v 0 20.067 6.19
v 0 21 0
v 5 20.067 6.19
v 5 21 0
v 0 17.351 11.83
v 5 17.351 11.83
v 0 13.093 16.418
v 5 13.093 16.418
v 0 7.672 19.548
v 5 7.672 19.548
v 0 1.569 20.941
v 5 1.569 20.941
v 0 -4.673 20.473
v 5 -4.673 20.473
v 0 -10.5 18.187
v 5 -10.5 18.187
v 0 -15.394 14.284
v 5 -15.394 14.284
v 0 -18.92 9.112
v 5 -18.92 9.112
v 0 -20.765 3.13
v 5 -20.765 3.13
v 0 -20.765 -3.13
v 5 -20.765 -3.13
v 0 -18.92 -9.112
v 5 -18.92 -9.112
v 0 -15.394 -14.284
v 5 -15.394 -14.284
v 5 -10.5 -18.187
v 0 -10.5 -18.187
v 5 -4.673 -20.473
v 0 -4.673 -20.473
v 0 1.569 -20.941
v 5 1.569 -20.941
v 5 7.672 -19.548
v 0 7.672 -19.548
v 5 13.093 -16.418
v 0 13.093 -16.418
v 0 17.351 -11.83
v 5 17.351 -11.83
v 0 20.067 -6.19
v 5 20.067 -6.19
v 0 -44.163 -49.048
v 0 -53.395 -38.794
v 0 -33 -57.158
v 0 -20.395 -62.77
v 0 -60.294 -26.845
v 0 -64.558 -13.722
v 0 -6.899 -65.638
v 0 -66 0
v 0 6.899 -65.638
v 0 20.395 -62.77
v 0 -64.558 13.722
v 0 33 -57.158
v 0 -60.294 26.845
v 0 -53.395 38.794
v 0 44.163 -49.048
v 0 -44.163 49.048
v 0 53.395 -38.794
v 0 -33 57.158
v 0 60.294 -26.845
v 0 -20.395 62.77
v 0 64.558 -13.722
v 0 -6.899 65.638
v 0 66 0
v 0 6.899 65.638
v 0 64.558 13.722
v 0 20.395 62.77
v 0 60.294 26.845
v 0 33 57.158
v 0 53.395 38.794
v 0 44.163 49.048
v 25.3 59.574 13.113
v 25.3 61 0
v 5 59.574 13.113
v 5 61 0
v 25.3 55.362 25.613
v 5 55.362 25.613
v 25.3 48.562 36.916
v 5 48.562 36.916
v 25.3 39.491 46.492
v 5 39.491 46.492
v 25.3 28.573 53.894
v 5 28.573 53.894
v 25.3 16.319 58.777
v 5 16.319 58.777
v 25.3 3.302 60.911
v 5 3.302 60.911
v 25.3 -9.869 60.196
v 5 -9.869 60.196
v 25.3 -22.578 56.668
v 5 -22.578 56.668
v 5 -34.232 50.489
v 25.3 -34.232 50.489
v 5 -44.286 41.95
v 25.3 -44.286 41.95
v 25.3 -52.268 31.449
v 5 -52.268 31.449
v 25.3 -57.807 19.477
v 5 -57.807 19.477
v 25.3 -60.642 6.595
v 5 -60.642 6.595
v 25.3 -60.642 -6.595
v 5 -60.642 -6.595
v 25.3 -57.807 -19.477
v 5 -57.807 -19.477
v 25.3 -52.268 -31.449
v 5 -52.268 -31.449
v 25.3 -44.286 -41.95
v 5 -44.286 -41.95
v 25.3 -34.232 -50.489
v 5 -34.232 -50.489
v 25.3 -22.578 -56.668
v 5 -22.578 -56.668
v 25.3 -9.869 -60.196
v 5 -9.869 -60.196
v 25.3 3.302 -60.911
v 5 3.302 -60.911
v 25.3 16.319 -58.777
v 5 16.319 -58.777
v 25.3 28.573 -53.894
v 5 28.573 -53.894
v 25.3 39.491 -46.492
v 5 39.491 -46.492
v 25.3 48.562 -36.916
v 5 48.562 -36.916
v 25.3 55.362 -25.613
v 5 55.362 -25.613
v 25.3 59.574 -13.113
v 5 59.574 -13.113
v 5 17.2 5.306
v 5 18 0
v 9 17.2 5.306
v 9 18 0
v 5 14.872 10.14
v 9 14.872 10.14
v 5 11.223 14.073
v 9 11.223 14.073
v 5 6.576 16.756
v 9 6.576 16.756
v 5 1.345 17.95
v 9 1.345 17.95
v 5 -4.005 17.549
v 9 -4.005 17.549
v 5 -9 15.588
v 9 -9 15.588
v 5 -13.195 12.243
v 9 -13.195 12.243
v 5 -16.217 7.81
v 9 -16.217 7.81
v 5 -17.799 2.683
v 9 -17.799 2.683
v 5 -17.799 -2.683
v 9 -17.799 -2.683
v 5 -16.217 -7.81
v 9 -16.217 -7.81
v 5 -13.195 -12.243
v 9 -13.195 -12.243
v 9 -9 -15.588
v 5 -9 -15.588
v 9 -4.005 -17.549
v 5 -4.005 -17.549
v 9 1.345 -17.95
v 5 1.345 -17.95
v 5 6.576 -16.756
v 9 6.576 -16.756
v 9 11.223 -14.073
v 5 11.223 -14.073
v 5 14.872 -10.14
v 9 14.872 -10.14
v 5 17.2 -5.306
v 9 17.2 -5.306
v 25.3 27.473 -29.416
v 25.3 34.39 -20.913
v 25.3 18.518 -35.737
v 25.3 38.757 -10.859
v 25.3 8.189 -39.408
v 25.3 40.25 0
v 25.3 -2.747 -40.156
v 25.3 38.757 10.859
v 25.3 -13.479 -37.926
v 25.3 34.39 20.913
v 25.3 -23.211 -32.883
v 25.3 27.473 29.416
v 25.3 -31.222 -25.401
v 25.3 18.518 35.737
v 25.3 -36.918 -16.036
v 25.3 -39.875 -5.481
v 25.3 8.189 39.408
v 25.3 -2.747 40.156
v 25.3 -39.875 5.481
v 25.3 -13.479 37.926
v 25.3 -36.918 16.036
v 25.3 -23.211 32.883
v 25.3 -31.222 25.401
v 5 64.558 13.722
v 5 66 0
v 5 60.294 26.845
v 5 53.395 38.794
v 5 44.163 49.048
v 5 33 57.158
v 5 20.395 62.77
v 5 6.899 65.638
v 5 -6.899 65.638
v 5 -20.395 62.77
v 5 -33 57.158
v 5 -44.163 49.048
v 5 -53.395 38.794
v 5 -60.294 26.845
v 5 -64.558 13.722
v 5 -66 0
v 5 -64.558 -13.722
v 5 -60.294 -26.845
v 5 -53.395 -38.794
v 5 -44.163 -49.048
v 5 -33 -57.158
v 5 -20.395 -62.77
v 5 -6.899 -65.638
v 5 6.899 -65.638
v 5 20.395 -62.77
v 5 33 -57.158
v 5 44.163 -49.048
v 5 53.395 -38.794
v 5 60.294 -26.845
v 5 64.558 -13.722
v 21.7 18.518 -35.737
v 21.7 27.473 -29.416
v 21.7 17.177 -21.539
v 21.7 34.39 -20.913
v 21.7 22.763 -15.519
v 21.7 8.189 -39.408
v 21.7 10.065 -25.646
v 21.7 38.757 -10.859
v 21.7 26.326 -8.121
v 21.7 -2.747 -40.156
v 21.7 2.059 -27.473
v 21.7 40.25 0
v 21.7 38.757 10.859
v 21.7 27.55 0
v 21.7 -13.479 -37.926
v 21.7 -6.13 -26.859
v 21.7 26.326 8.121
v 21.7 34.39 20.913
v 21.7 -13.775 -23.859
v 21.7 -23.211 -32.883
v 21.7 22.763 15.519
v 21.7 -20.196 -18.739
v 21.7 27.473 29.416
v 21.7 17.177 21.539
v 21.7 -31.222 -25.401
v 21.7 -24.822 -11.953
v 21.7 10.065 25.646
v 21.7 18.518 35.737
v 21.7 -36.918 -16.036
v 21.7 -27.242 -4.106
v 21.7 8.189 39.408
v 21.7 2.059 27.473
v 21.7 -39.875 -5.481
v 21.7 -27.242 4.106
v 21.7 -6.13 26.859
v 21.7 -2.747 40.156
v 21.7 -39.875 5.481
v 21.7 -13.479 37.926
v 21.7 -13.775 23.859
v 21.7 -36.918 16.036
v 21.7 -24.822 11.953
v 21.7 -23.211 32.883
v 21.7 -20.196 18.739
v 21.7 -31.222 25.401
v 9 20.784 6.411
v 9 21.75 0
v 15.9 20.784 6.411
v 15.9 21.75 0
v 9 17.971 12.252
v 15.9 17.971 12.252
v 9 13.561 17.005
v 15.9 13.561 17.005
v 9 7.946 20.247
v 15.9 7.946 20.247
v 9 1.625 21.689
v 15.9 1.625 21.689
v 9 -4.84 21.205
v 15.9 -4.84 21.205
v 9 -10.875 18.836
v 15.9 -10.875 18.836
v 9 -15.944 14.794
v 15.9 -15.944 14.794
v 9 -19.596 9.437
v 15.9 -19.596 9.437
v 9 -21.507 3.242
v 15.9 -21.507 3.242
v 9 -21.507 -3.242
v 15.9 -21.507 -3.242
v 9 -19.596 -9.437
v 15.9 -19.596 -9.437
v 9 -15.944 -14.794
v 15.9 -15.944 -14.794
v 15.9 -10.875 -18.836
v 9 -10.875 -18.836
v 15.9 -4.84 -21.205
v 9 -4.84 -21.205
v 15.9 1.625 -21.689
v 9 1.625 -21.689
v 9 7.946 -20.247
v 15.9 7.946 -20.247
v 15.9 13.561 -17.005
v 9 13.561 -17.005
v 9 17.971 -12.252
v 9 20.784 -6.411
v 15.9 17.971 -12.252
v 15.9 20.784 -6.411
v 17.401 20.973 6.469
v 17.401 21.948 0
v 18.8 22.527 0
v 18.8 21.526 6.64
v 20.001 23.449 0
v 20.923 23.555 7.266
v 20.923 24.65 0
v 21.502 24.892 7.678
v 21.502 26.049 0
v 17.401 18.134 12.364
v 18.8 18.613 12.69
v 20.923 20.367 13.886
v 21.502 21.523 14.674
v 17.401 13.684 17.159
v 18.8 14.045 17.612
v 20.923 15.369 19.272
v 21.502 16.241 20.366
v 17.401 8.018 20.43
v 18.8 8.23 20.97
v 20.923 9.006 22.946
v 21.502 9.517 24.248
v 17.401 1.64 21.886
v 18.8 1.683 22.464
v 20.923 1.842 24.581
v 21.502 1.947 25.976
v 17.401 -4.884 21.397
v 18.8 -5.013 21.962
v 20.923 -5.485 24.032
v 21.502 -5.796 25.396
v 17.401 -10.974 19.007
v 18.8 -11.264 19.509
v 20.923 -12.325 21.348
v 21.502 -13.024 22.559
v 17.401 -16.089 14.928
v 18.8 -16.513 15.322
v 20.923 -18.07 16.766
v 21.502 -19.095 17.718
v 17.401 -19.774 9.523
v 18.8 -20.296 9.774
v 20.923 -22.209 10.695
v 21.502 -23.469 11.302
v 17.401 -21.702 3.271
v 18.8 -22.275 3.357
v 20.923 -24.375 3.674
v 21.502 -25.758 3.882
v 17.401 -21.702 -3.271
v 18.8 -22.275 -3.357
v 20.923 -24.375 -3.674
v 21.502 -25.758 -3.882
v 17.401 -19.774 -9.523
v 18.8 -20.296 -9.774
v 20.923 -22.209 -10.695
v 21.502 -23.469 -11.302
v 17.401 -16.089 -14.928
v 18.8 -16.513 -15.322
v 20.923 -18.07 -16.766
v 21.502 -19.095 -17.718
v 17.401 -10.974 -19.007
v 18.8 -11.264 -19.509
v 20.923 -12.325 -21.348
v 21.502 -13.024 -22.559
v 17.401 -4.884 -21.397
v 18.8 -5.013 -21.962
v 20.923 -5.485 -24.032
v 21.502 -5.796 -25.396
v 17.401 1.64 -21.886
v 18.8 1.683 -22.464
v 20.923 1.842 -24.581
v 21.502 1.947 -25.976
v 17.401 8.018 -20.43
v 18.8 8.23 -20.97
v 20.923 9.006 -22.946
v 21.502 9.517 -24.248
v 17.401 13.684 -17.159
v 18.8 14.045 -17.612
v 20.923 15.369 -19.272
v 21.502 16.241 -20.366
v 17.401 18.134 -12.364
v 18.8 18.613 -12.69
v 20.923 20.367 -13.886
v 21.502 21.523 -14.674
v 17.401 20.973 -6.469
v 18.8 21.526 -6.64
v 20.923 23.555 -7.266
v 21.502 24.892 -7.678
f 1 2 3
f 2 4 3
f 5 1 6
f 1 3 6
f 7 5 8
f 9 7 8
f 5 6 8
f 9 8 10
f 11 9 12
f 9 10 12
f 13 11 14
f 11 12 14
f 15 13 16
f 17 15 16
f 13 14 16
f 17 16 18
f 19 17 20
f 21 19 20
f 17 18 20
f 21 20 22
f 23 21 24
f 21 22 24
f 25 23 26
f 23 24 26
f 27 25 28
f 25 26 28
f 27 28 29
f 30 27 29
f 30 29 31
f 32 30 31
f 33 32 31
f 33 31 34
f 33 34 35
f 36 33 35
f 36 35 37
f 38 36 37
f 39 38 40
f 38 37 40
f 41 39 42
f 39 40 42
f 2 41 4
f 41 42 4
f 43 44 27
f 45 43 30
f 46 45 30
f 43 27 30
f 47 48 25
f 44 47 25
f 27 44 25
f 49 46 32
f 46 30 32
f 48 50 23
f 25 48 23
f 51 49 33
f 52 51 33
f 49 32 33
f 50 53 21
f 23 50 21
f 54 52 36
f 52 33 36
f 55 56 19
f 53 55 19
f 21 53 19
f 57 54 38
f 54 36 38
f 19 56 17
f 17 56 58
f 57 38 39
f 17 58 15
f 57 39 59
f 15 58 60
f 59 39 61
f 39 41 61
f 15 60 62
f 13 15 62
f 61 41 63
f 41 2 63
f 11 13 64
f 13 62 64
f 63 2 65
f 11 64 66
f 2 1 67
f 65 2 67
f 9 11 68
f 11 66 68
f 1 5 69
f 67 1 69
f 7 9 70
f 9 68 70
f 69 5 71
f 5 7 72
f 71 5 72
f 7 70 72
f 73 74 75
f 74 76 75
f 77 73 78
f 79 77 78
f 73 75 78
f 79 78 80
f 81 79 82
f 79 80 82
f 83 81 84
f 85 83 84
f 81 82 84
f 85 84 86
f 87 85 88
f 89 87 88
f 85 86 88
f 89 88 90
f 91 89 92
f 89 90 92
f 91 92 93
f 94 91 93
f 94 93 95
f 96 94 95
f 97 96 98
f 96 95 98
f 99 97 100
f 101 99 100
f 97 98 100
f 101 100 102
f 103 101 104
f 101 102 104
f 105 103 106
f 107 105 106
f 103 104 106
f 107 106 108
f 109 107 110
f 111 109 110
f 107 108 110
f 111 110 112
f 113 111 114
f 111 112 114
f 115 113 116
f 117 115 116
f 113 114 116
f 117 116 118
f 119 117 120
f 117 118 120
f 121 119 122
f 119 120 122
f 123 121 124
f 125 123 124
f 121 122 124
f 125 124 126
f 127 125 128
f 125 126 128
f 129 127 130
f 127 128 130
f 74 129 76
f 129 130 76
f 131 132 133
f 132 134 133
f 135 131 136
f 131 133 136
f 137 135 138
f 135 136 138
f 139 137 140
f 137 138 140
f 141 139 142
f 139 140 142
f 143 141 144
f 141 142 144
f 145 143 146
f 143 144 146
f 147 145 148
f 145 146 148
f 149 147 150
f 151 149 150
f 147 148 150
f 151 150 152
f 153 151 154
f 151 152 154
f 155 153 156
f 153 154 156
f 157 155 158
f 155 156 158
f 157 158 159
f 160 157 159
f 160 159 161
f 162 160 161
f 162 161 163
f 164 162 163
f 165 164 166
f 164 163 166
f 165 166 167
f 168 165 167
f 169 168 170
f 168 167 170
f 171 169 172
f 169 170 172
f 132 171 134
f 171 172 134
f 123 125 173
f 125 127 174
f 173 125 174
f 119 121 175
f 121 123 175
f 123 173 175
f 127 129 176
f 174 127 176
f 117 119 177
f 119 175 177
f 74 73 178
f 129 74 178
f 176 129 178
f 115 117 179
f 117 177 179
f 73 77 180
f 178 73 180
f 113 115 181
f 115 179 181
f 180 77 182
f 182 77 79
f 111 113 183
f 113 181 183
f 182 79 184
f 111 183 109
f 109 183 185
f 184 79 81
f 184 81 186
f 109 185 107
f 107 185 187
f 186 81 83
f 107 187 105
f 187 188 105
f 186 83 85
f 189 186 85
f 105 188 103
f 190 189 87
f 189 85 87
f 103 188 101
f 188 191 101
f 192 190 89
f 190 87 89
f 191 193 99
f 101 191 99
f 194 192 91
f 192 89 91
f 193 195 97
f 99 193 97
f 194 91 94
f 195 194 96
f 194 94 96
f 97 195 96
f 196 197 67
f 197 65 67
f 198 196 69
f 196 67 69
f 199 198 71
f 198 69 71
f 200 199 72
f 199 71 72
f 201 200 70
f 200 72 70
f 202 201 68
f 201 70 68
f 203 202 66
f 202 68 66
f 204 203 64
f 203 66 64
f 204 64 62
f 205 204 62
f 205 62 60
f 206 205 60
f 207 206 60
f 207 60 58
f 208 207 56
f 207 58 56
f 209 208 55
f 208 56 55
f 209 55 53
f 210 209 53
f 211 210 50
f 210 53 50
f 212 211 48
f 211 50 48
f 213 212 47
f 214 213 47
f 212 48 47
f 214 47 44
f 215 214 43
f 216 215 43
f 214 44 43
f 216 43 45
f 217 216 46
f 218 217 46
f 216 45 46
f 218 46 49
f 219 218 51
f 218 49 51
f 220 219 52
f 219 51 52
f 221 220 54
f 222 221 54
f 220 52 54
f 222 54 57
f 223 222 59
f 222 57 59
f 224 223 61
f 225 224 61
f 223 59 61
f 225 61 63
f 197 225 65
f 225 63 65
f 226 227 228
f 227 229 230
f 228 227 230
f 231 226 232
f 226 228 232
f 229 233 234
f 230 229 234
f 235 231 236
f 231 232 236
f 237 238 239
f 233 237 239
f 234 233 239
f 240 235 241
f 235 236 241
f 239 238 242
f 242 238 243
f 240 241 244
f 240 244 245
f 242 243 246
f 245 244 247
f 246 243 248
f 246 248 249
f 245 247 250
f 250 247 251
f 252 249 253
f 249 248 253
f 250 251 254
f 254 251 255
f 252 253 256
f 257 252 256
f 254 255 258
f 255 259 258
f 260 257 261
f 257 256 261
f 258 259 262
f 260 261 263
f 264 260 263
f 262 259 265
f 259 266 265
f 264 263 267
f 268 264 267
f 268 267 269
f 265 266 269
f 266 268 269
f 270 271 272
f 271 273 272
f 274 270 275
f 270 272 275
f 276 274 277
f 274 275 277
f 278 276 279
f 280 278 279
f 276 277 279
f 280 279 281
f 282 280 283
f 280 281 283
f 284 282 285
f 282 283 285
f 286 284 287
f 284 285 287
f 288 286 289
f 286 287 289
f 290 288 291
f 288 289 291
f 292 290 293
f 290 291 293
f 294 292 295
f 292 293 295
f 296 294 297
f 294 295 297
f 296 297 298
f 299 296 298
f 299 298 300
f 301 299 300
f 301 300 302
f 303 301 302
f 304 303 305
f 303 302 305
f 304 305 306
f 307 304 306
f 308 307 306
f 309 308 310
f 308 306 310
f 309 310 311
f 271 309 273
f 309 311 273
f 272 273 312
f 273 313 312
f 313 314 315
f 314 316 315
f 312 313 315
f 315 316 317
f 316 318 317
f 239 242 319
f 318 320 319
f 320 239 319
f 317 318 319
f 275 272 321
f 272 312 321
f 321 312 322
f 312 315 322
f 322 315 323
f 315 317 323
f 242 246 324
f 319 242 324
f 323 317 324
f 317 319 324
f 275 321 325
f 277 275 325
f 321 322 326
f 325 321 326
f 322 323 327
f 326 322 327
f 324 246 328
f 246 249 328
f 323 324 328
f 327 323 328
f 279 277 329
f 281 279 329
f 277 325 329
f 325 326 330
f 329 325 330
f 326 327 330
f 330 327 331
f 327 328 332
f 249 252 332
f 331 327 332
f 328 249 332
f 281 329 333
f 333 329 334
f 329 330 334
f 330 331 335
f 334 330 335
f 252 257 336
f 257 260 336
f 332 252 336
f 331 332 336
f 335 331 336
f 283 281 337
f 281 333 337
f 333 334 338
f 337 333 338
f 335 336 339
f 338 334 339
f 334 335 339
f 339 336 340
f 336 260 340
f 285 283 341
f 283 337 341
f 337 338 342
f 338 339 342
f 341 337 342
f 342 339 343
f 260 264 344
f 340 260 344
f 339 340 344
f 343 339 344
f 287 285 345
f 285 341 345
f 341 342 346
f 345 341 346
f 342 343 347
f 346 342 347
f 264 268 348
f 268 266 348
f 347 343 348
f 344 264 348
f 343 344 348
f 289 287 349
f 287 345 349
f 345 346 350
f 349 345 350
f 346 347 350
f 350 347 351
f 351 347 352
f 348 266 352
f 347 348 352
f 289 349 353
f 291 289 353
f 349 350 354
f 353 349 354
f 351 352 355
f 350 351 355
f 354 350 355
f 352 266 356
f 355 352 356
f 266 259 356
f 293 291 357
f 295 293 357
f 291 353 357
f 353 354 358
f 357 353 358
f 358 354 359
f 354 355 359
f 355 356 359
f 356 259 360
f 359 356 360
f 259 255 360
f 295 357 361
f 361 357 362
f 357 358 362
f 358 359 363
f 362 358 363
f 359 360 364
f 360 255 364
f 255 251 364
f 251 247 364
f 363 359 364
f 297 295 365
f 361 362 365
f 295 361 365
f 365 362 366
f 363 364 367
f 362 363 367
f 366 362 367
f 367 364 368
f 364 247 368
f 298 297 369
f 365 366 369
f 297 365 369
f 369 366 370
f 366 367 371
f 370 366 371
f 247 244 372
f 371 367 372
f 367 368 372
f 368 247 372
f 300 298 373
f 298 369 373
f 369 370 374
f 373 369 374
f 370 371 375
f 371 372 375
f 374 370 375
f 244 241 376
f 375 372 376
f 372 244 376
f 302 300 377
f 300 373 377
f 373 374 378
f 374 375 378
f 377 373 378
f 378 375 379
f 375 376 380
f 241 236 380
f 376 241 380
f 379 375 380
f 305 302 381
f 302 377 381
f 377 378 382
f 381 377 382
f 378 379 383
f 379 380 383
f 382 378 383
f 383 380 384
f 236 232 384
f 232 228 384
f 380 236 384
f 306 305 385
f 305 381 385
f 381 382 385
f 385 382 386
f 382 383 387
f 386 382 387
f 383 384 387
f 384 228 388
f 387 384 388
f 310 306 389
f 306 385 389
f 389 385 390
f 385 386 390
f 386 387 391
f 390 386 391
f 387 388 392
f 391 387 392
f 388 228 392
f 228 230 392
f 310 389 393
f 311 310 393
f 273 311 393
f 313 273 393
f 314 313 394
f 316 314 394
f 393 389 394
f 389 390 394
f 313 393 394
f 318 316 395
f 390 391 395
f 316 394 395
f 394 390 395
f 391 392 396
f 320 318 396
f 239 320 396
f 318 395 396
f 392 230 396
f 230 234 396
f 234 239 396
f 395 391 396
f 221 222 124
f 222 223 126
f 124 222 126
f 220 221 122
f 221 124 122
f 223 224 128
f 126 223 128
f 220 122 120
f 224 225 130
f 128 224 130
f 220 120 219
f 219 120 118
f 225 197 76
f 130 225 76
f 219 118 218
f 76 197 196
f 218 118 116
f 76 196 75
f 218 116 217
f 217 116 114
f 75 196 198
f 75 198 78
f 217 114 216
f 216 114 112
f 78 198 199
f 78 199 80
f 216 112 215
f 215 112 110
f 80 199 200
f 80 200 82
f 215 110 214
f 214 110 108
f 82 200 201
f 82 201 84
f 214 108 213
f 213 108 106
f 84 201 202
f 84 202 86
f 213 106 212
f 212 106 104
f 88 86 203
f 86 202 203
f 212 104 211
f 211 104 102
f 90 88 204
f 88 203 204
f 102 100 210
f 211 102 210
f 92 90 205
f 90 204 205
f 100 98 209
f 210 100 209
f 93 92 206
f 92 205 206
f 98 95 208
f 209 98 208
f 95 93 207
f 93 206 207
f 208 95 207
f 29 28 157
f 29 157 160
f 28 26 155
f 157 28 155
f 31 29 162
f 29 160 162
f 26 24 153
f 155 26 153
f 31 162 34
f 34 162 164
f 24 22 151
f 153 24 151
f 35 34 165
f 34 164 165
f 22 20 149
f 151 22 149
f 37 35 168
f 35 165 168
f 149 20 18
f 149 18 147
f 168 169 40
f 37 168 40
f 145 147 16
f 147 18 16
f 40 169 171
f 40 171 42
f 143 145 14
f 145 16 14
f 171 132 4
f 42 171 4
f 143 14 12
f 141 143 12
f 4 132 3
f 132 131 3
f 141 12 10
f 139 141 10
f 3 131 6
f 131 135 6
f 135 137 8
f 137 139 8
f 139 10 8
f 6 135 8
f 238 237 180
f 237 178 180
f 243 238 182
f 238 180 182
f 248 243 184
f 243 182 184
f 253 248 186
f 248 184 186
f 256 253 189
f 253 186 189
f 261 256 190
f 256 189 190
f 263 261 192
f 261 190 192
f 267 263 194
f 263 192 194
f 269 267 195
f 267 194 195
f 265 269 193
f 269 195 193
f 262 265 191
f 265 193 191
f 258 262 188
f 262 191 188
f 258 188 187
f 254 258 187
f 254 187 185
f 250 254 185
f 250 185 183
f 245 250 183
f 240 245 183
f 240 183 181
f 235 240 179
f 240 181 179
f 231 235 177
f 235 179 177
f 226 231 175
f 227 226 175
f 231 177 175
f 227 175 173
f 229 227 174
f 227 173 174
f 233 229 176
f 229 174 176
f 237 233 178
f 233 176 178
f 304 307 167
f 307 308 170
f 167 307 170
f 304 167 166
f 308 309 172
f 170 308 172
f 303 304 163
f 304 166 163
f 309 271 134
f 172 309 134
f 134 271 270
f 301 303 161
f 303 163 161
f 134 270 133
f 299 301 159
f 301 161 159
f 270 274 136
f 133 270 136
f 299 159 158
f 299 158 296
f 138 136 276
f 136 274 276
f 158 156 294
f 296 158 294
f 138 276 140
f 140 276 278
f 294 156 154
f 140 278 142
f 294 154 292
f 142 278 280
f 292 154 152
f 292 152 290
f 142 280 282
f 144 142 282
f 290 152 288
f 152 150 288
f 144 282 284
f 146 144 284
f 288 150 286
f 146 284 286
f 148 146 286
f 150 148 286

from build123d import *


with BuildPart() as part:
    # Sketch1 → Body (revolve)
    with BuildSketch(Plane.XY):
        with BuildLine():
            Line((0, 21), (5, 21))
            Line((5, 21), (5, 18))
            Line((5, 18), (9, 18))
            Line((9, 18), (9, 21.75))
            Line((9, 21.75), (15.9, 21.75))
            ThreePointArc((15.9, 21.75), (20.001219331, 23.448780669), (21.7, 27.55))
            Line((21.7, 27.55), (21.7, 40.25))
            Line((21.7, 40.25), (25.3, 40.25))
            Line((25.3, 40.25), (25.3, 61))
            Line((25.3, 61), (5, 61))
            Line((5, 61), (5, 66))
            Line((5, 66), (0, 66))
            Line((0, 66), (0, 21))
        make_face()
    revolve(axis=Axis((0, 0, 0), (1, 0, 0)))


solid = part.part
